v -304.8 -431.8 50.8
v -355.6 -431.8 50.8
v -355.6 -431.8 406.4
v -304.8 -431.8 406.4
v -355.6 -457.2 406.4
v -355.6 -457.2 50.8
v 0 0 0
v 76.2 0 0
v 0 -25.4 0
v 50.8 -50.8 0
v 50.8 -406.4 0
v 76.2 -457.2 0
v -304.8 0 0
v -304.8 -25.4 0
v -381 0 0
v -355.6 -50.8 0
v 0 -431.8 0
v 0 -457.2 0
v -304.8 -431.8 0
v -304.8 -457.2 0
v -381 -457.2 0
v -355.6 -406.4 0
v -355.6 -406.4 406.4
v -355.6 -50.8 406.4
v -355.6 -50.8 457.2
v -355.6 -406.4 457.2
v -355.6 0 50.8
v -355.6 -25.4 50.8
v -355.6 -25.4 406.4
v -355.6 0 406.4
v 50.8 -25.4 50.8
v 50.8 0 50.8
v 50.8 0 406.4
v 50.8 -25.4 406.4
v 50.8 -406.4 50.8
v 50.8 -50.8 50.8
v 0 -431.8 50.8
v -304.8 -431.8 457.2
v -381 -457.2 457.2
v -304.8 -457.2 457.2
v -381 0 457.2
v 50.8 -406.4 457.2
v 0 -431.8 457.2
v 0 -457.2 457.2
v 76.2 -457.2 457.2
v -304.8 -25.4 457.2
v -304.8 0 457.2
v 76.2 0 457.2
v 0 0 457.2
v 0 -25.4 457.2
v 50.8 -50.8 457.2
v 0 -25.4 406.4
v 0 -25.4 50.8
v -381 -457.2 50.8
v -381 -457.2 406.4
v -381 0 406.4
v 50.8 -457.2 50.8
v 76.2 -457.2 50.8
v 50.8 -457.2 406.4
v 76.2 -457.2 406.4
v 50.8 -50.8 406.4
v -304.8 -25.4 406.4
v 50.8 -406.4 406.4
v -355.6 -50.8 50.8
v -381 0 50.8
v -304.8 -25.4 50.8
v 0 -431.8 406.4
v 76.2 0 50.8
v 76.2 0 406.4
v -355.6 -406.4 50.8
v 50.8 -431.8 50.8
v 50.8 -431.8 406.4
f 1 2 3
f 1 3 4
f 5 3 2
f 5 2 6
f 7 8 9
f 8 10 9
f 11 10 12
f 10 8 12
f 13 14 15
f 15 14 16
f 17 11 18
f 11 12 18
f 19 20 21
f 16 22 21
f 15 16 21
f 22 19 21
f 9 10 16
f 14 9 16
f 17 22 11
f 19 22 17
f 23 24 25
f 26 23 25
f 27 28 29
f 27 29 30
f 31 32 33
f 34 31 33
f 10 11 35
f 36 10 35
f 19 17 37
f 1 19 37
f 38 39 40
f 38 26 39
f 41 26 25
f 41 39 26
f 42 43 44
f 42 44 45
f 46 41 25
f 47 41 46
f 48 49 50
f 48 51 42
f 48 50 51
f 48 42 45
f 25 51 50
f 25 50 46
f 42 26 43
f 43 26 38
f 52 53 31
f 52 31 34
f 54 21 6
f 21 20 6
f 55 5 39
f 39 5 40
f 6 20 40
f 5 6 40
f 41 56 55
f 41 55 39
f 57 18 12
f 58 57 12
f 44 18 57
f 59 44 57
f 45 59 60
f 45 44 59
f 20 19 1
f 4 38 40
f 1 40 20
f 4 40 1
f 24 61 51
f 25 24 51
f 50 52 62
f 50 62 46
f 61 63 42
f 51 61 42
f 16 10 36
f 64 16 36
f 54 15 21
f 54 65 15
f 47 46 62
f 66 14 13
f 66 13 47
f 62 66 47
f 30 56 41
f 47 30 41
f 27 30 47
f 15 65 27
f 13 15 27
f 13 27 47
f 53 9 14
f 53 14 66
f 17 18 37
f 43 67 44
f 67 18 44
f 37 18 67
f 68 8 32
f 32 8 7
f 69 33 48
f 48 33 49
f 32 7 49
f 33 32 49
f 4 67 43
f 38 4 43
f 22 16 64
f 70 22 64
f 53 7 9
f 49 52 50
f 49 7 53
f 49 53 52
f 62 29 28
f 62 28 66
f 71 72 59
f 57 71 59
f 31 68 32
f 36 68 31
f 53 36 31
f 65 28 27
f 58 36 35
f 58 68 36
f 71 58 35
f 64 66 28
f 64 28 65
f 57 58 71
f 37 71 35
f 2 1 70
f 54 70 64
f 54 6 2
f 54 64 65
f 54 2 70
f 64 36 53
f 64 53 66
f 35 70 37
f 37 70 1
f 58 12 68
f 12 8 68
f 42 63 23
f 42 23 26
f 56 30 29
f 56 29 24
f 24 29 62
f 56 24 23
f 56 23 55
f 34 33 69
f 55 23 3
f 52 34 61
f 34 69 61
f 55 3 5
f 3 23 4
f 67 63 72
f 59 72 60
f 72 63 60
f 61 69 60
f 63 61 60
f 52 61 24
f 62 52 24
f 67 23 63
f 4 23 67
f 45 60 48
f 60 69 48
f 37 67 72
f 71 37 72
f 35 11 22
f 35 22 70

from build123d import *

# Parameters (mm, degrees)
F0_W      = 50.8
F0_H      = 457.2
F1_DEPTH  = 25.4
F2_W      = 25.4
F2_H      = 50.8
F3_DEPTH  = 25.4
F4_W      = 25.4
F4_H      = 50.8
F5_DEPTH  = 431.8
F6_W      = 25.4
F6_H      = 50.8
F7_DEPTH  = 50.8
F8_W      = 50.8
F8_H      = 25.4
F9_DEPTH  = 406.4
F10_W     = 25.4
F10_H     = 50.8
F11_DEPTH = 25.4
F12_W     = 25.4
F12_H     = 50.8
F13_DEPTH = 431.8
F14_W     = 50.8
F14_H     = 50.8
F15_DEPTH = 25.4
F16_W     = 25.4
F16_H     = 50.8
F17_DEPTH = 381
F18_W     = 76.2
F18_H     = 50.8
F19_DEPTH = 25.4
F20_W     = 50.8
F20_H     = 25.4
F21_DEPTH = 406.4
F22_W     = 25.4
F22_H     = 50.8
F23_DEPTH = 406.4
F24_W     = 25.4
F24_H     = 50.8
F25_DEPTH = 431.8
F26_W     = 25.4
F26_H     = 50.8
F27_DEPTH = 406.4
F28_W     = 25.4
F28_H     = 50.8
F29_DEPTH = 25.4
F30_W     = 25.4
F30_H     = 50.8
F31_DEPTH = 431.8
F32_W     = 25.4
F32_H     = 50.8
F33_DEPTH = 431.8
F34_W     = 50.8
F34_H     = 50.8
F35_DEPTH = 25.4
F36_W     = 50.8
F36_H     = 25.4
F37_DEPTH = 406.4


with BuildPart() as f1:
    # F0 (on Front) → F1 (new body)
    with BuildSketch(Plane.XZ):
        with Locations((25.4, 228.6)):
            Rectangle(F0_W, F0_H)
    extrude(amount=F1_DEPTH)

    # F2 (on face) → F3 (join)
    with BuildSketch(Plane.YZ.offset(50.8)):
        with Locations((-12.7, 431.8)):
            Rectangle(F2_W, F2_H)
    extrude(amount=F3_DEPTH)

    # F4 (on face) → F5 (join)
    with BuildSketch(Plane.XZ.offset(25.4)):
        with Locations((63.5, 431.8)):
            Rectangle(F4_W, F4_H)
    extrude(amount=F5_DEPTH)

    # F6 (on face) → F7 (join)
    with BuildSketch(Plane(origin=(50.8, 0, 0), x_dir=(0, -1, 0), z_dir=(-1, 0, 0))):
        with Locations((444.5, 431.8)):
            Rectangle(F6_W, F6_H)
    extrude(amount=F7_DEPTH)

    # F8 (on face) → F9 (join)
    with BuildSketch(Plane(origin=(0, 0, 406.4), x_dir=(1, 0, 0), z_dir=(0, 0, -1))):
        with Locations((25.4, 444.5)):
            Rectangle(F8_W, F8_H)
    extrude(amount=F9_DEPTH)

    # F10 (on face) → F11 (join)
    with BuildSketch(Plane.YZ.offset(50.8)):
        with Locations((-12.7, 25.4)):
            Rectangle(F10_W, F10_H)
    extrude(amount=F11_DEPTH)

    # F12 (on face) → F13 (join)
    with BuildSketch(Plane.XZ.offset(25.4)):
        with Locations((63.5, 25.4)):
            Rectangle(F12_W, F12_H)
    extrude(amount=F13_DEPTH)

    # F14 (on face) → F15 (join)
    with BuildSketch(Plane(origin=(0, -431.8, 0), x_dir=(-1, 0, 0), z_dir=(0, 1, 0))):
        with Locations((-25.4, 431.8)):
            Rectangle(F14_W, F14_H)
    extrude(amount=F15_DEPTH)

    # F16 (on face) → F17 (join)
    with BuildSketch(Plane(origin=(0, 0, 0), x_dir=(0, -1, 0), z_dir=(-1, 0, 0))):
        with Locations((419.1, 431.8)):
            Rectangle(F16_W, F16_H)
    extrude(amount=F17_DEPTH)

    # F18 (on face) → F19 (join)
    with BuildSketch(Plane.XZ.offset(431.8)):
        with Locations((-342.9, 431.8)):
            Rectangle(F18_W, F18_H)
    extrude(amount=F19_DEPTH)

    # F20 (on face) → F21 (join)
    with BuildSketch(Plane(origin=(0, 0, 406.4), x_dir=(1, 0, 0), z_dir=(0, 0, -1))):
        with Locations((-330.2, 444.5)):
            Rectangle(F20_W, F20_H)
    extrude(amount=F21_DEPTH)

    # F22 (on face) → F23 (join)
    with BuildSketch(Plane(origin=(0, -406.4, 0), x_dir=(-1, 0, 0), z_dir=(0, 1, 0))):
        with Locations((368.3, 431.8)):
            Rectangle(F22_W, F22_H)
    extrude(amount=F23_DEPTH)

    # F24 (on face) → F25 (join)
    with BuildSketch(Plane(origin=(50.8, 0, 0), x_dir=(0, -1, 0), z_dir=(-1, 0, 0))):
        with Locations((419.1, 25.4)):
            Rectangle(F24_W, F24_H)
    extrude(amount=F25_DEPTH)

    # F26 (on face) → F27 (join)
    with BuildSketch(Plane(origin=(0, -406.4, 0), x_dir=(-1, 0, 0), z_dir=(0, 1, 0))):
        with Locations((368.3, 25.4)):
            Rectangle(F26_W, F26_H)
    extrude(amount=F27_DEPTH)

    # F28 (on face) → F29 (join)
    with BuildSketch(Plane(origin=(-355.6, 0, 0), x_dir=(0, -1, 0), z_dir=(-1, 0, 0))):
        with Locations((444.5, 25.4)):
            Rectangle(F28_W, F28_H)
    extrude(amount=F29_DEPTH)

    # F30 (on face) → F31 (join)
    with BuildSketch(Plane(origin=(50.8, 0, 0), x_dir=(0, -1, 0), z_dir=(-1, 0, 0))):
        with Locations((38.1, 25.4)):
            Rectangle(F30_W, F30_H)
    extrude(amount=F31_DEPTH)

    # F32 (on face) → F33 (join)
    with BuildSketch(Plane(origin=(50.8, 0, 0), x_dir=(0, -1, 0), z_dir=(-1, 0, 0))):
        with Locations((38.1, 431.8)):
            Rectangle(F32_W, F32_H)
    extrude(amount=F33_DEPTH)

    # F34 (on face) → F35 (join)
    with BuildSketch(Plane(origin=(0, -25.4, 0), x_dir=(-1, 0, 0), z_dir=(0, 1, 0))):
        with Locations((330.2, 25.4)):
            Rectangle(F34_W, F34_H)
    extrude(amount=F35_DEPTH)

    # F36 (on face) → F37 (join)
    with BuildSketch(Plane.XY.offset(50.8)):
        with Locations((-330.2, -12.7)):
            Rectangle(F36_W, F36_H)
    extrude(amount=F37_DEPTH)


solid = f1.part
